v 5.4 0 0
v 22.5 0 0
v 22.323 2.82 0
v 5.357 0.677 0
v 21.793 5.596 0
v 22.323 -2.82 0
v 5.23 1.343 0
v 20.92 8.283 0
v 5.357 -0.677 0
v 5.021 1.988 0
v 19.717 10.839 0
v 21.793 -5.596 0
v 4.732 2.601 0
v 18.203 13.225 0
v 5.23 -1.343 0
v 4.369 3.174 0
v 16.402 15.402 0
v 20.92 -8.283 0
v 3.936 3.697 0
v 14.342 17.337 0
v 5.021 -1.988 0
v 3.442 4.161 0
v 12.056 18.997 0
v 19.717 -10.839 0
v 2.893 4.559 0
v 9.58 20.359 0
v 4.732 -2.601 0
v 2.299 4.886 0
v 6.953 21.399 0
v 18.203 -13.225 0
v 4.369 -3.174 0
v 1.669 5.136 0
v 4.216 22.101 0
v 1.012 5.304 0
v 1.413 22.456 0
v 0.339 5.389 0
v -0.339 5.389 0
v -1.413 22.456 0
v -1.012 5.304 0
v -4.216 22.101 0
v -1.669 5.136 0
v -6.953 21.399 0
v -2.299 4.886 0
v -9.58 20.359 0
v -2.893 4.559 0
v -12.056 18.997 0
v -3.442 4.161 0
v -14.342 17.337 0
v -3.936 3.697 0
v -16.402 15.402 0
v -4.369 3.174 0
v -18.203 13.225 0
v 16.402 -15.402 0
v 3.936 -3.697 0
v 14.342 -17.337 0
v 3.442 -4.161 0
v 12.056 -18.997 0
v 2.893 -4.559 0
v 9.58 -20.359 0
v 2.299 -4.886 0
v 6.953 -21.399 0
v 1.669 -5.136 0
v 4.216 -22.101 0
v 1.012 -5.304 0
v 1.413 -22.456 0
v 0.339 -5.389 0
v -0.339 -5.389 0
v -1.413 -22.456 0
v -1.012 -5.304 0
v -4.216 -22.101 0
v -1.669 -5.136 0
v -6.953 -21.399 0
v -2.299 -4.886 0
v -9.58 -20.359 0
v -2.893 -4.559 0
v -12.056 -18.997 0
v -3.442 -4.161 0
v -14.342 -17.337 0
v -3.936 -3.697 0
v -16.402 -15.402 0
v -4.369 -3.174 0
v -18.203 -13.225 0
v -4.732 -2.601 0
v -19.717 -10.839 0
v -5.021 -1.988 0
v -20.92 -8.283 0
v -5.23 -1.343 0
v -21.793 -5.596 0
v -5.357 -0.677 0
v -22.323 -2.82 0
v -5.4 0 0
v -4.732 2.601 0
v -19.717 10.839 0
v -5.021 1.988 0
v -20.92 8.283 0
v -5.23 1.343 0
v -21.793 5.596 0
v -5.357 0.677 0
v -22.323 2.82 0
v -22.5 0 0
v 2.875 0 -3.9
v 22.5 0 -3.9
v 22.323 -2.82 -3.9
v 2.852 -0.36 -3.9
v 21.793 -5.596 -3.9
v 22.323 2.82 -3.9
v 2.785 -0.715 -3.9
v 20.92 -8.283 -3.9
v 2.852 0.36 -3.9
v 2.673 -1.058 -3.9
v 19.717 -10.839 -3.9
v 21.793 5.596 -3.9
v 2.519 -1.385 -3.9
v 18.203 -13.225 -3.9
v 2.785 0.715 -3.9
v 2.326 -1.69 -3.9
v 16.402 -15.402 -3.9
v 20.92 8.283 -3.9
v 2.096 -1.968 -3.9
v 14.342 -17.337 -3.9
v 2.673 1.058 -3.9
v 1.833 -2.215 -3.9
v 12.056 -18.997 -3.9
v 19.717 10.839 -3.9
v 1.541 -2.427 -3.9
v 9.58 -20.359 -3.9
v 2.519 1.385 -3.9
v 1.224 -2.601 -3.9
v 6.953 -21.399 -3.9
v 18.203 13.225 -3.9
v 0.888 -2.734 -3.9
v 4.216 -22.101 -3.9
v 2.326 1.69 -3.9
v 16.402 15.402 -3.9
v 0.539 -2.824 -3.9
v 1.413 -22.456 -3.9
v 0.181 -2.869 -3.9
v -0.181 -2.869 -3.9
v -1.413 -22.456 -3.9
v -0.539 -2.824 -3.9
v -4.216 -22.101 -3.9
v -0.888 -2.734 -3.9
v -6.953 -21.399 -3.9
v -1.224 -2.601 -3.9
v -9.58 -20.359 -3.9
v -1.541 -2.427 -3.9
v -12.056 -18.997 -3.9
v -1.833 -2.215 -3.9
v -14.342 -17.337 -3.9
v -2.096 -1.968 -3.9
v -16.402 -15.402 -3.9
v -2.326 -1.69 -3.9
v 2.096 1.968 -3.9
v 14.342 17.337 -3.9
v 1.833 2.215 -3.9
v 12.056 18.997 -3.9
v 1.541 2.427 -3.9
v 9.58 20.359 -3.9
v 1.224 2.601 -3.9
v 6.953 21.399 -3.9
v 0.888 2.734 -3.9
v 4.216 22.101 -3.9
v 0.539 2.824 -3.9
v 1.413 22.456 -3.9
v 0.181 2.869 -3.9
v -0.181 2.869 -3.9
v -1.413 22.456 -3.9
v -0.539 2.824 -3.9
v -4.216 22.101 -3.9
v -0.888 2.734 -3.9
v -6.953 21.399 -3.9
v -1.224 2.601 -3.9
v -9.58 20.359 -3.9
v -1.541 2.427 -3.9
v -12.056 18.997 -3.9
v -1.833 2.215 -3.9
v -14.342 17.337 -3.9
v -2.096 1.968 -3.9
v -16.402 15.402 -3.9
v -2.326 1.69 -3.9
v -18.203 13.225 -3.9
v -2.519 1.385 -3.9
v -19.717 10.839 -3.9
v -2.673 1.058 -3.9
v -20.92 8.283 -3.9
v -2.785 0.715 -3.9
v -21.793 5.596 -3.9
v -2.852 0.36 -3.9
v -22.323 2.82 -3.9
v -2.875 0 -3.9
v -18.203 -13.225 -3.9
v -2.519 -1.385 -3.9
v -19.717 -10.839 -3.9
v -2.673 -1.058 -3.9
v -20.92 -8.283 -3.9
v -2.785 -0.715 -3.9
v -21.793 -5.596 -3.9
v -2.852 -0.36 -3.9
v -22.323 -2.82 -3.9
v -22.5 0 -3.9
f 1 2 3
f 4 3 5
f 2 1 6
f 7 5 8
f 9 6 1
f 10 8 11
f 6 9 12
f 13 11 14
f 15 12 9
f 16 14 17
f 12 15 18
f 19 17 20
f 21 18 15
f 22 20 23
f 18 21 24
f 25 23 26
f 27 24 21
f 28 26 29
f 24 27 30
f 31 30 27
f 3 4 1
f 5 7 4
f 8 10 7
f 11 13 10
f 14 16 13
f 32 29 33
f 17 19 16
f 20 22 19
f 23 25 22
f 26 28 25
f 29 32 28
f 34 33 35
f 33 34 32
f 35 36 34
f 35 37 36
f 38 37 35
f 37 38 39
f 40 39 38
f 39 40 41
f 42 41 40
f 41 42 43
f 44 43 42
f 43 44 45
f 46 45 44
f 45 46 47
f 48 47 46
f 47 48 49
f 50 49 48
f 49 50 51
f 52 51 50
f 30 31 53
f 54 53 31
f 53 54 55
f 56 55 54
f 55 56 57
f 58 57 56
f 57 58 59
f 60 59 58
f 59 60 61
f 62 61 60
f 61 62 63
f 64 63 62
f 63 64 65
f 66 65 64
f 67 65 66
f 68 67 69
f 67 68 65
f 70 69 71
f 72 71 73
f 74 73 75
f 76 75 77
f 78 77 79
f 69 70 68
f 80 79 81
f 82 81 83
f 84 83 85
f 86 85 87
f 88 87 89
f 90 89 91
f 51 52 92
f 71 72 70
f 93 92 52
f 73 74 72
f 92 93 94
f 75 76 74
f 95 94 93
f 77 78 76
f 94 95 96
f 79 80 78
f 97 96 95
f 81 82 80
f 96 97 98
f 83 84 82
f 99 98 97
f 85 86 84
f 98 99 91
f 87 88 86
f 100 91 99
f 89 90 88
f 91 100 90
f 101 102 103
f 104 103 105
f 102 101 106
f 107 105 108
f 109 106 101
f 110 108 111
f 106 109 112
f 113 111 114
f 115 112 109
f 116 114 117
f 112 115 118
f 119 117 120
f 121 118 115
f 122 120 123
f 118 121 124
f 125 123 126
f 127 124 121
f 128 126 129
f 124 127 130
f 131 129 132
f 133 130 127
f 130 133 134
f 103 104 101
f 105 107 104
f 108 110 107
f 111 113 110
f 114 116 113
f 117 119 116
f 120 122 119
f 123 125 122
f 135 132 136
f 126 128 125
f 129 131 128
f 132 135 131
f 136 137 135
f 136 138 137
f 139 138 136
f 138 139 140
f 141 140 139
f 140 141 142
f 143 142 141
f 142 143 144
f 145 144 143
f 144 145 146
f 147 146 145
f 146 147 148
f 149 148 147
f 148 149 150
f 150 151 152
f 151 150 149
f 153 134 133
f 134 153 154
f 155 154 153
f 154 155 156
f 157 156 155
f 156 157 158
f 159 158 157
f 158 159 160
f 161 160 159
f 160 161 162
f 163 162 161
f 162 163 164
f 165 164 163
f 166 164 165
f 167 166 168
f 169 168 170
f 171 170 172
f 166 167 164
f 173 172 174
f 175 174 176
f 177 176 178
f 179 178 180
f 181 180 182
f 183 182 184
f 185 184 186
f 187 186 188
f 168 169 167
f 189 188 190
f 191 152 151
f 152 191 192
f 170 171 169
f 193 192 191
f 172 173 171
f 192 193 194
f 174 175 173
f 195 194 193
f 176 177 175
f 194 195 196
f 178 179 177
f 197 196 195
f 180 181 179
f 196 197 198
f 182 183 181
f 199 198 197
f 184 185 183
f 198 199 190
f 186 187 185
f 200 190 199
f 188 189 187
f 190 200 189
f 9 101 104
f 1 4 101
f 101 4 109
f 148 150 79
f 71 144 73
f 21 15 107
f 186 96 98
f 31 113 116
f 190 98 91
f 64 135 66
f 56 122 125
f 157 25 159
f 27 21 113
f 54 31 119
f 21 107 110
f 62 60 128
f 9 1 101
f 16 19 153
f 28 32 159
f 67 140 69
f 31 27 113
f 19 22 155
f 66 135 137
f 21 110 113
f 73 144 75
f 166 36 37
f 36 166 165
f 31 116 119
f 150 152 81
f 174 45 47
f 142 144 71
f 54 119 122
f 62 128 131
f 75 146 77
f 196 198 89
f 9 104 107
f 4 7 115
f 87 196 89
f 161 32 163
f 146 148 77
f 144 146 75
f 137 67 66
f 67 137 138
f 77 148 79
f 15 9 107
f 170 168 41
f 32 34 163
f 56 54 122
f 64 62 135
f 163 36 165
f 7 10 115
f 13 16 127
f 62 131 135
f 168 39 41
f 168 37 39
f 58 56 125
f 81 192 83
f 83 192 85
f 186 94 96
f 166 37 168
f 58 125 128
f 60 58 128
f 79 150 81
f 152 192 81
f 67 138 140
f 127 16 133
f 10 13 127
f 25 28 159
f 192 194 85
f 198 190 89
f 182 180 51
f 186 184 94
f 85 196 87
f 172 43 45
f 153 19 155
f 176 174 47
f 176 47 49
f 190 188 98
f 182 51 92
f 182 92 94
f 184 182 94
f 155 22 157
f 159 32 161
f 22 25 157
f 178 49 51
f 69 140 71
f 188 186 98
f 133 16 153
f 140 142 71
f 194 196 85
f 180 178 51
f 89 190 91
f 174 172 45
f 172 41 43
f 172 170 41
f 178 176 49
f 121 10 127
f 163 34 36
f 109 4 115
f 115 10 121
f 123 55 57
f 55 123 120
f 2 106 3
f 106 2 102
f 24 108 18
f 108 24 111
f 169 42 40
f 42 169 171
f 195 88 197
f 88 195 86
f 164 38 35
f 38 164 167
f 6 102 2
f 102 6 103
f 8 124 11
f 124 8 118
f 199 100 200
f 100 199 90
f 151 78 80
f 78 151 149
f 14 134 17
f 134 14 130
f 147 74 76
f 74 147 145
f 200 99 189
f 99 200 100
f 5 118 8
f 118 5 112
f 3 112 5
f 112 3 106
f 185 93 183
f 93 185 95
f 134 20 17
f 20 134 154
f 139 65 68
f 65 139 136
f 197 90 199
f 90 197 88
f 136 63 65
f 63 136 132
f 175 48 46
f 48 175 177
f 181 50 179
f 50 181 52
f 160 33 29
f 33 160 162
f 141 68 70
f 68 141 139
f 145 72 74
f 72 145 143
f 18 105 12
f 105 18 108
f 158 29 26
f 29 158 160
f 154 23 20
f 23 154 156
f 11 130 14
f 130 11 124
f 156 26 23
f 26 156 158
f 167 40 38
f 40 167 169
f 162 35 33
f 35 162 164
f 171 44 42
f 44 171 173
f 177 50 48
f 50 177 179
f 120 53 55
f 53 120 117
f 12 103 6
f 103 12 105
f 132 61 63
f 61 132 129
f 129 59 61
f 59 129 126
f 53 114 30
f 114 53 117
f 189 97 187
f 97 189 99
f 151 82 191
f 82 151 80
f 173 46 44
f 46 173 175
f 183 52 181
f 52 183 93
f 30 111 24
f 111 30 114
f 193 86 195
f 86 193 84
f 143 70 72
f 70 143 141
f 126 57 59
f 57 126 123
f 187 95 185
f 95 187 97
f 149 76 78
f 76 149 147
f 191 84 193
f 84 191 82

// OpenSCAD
$fn = 50;


difference() {
	union() {
		translate(v = [0, 0, -3.9000000000]) {
			cylinder(h = 3.9000000000, r = 22.5000000000);
		}
	}
	union() {
		translate(v = [0, 0, 0]) {
			rotate(a = [0, 0, 0]) {
				difference() {
					union() {
						translate(v = [0, 0, -3.9000000000]) {
							cylinder(h = 3.9000000000, r = 2.6000000000);
						}
						translate(v = [0, 0, -3.9000000000]) {
							cylinder(h = 3.9000000000, r1 = 2.8750000000, r2 = 5.4000000000);
						}
						translate(v = [0, 0, -3.9000000000]) {
							cylinder(h = 3.9000000000, r = 2.8750000000);
						}
						translate(v = [0, 0, -3.9000000000]) {
							cylinder(h = 3.9000000000, r = 2.6000000000);
						}
					}
					union();
				}
			}
		}
	}
}
